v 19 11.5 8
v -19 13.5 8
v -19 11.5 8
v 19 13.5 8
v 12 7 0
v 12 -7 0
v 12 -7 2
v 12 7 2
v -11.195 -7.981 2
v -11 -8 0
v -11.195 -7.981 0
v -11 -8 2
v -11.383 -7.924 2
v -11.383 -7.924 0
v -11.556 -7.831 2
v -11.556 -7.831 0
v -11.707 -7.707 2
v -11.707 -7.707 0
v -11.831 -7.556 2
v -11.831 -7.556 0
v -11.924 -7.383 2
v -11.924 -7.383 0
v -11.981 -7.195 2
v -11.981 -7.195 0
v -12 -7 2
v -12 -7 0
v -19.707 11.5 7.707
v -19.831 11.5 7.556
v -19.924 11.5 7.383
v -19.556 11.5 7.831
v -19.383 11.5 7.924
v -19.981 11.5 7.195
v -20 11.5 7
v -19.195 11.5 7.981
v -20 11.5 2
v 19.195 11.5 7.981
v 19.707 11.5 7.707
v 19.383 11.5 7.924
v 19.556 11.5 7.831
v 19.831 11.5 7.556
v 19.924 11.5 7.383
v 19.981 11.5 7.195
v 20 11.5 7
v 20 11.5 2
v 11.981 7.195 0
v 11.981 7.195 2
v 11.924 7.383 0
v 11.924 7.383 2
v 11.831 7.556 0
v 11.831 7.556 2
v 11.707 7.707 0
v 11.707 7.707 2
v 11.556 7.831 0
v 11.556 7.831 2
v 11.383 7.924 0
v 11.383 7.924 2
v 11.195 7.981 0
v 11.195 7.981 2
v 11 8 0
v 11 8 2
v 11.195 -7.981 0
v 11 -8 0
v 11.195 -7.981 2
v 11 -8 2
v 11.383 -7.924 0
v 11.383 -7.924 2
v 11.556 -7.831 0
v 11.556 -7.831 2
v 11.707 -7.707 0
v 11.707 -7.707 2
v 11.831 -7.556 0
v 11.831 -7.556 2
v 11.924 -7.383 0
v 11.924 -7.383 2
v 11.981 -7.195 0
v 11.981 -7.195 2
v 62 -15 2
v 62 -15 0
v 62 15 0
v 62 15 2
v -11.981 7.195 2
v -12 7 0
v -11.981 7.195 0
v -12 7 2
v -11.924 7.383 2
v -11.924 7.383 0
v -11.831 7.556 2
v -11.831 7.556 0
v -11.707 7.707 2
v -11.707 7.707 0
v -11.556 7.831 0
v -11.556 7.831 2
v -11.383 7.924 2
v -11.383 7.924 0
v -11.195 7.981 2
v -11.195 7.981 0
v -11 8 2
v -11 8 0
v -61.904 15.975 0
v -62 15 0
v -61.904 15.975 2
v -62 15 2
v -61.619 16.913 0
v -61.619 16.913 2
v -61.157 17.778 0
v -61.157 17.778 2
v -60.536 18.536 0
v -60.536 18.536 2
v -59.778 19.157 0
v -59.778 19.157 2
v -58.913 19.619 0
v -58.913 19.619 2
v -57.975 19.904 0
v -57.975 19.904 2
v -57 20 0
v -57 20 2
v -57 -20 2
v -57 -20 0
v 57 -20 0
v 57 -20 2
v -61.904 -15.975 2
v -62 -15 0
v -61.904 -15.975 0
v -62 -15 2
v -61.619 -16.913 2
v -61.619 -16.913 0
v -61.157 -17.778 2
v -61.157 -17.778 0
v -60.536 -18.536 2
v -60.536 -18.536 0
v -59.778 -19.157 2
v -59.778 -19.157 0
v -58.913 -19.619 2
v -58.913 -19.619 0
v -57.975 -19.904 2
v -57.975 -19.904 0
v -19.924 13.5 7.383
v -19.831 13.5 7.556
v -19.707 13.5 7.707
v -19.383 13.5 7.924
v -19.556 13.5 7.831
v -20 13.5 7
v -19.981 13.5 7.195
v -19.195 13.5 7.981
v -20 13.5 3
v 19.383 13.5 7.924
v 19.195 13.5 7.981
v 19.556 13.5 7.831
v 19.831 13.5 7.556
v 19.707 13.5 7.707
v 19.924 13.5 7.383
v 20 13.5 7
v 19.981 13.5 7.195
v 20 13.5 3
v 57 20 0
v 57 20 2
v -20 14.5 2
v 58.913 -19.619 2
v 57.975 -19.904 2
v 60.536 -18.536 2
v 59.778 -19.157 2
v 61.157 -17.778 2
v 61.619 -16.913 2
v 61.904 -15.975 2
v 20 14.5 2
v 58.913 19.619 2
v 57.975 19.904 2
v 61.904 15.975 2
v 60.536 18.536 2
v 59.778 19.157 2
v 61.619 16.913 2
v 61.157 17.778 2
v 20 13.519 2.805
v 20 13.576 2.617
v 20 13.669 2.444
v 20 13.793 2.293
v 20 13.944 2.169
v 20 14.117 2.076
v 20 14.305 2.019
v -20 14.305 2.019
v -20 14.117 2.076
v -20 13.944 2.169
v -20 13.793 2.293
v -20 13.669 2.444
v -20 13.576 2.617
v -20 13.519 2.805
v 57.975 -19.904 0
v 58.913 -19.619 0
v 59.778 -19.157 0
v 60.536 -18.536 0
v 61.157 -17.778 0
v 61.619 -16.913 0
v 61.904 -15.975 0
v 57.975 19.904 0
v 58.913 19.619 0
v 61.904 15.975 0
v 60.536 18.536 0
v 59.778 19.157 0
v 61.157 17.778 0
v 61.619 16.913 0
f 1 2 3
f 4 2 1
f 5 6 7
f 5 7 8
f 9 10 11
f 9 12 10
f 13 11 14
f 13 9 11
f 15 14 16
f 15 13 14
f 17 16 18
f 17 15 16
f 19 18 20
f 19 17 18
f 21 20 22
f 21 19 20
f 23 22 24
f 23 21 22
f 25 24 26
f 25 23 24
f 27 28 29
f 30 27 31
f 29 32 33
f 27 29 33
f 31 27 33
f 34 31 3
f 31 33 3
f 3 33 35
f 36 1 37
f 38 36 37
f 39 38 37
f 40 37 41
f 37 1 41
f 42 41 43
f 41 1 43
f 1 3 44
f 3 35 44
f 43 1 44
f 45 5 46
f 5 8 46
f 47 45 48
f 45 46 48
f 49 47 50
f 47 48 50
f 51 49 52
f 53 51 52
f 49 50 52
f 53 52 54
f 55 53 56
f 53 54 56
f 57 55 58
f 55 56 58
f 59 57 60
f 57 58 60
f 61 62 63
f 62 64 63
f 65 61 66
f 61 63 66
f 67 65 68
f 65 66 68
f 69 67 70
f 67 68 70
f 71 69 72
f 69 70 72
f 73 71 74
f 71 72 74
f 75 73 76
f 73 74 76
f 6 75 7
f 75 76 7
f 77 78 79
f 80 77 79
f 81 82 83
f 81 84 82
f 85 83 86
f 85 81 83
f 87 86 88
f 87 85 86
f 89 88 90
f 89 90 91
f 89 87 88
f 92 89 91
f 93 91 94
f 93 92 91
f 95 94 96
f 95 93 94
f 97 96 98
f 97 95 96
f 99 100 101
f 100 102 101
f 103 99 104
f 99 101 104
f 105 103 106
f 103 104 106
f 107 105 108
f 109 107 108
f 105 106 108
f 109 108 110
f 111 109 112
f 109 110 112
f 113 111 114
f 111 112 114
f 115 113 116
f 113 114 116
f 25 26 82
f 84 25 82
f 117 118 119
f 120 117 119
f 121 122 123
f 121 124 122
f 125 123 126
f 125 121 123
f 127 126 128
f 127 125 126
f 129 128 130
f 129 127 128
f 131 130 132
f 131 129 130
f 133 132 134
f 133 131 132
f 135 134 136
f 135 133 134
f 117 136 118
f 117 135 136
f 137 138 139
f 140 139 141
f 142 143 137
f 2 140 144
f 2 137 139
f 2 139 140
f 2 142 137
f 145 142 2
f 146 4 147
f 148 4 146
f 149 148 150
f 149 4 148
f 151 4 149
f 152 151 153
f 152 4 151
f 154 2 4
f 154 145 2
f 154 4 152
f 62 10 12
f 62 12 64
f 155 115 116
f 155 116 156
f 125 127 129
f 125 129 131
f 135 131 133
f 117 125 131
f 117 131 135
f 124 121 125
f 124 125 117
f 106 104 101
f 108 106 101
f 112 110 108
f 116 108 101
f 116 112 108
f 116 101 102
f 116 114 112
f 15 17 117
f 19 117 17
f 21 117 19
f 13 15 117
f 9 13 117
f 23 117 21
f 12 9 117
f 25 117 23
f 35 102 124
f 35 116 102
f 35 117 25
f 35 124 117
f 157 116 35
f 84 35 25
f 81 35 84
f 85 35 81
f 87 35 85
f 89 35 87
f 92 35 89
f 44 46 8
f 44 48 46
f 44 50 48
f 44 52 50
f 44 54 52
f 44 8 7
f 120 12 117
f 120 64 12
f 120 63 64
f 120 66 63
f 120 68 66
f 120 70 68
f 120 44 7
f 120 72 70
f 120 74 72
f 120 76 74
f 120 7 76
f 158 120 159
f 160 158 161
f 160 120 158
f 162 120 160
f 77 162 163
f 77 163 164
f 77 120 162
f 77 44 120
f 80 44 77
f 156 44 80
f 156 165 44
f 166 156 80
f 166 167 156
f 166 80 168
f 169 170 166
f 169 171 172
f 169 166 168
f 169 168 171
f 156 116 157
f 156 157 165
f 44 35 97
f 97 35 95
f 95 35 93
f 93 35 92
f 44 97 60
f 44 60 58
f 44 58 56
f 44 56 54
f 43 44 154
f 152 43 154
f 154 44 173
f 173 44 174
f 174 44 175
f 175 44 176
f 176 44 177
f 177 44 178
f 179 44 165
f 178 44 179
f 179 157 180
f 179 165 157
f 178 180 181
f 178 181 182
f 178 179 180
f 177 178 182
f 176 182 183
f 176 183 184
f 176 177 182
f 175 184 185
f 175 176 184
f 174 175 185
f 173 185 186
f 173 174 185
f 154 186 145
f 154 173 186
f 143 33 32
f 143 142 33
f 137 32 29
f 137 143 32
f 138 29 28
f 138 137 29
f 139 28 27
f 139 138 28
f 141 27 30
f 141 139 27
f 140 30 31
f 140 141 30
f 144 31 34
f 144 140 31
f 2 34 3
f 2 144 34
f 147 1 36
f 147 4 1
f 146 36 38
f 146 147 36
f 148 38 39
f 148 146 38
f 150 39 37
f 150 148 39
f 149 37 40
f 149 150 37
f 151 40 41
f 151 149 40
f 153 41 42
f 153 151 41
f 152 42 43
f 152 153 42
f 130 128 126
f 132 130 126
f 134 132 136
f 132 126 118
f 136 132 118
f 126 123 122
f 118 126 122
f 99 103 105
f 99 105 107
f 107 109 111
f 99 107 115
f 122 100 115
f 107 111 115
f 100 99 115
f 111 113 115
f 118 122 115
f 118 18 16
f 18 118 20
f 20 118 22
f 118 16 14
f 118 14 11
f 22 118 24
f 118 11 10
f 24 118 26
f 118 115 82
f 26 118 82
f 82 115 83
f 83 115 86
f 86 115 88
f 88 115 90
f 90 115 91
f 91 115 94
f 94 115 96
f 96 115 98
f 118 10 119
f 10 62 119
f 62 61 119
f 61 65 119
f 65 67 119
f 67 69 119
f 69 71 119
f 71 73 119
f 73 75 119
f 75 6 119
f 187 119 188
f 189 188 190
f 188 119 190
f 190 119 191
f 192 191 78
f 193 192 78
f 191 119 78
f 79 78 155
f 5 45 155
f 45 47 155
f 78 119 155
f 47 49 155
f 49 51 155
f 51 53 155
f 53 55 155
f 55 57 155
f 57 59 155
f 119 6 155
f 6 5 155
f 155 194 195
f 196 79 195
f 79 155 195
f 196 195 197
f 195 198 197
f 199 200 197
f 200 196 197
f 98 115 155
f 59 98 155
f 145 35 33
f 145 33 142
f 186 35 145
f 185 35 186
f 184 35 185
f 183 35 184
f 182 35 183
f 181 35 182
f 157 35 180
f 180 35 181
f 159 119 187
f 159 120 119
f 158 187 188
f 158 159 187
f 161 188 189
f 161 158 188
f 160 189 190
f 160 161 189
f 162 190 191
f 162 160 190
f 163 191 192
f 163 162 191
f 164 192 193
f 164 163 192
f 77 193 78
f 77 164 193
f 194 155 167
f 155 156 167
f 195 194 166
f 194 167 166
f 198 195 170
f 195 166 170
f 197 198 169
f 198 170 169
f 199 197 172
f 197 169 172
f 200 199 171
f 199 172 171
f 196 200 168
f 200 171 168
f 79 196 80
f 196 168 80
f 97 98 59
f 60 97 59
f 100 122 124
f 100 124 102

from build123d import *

# Parameters (mm, degrees)
F0_W     = 124
F0_H     = 40
F0_W_2   = 24
F0_H_2   = 16
F0_W_3   = 40
F0_H_3   = 2
F1_DEPTH = 2
F2_R     = 5
F3_R     = 1
F4_DEPTH = 8
F5_R     = 1


with BuildPart() as f1:
    # F0 (on Top) → F1 (new body)
    with BuildSketch(Plane.XY):
        Rectangle(F0_W, F0_H)
        Rectangle(F0_W_2, F0_H_2, mode=Mode.SUBTRACT)
        with Locations((0, 12.5)):
            Rectangle(F0_W_3, F0_H_3, mode=Mode.SUBTRACT)
    extrude(amount=F1_DEPTH)

    # F2
    f2_edges = [f1.edges().sort_by_distance(p)[0] for p in [
        (-62, 20, 1),
        (62, 20, 1),
        (62, -20, 1),
        (-62, -20, 1),
    ]]
    fillet(f2_edges, radius=F2_R)

    # F3
    f3_edges = [f1.edges().sort_by_distance(p)[0] for p in [
        (12, -8, 1),
        (-12, -8, 1),
        (12, 8, 1),
        (-12, 8, 1),
    ]]
    fillet(f3_edges, radius=F3_R)

    # F0 (on Top) → F4 (join)
    with BuildSketch(Plane.XY):
        with Locations((0, 12.5)):
            Rectangle(F0_W_3, F0_H_3)
    extrude(amount=F4_DEPTH)

    # F5
    f5_edges = [f1.edges().sort_by_distance(p)[0] for p in [
        (0, 13.5, 2),
        (20, 12.5, 8),
        (-20, 12.5, 8),
    ]]
    fillet(f5_edges, radius=F5_R)


solid = f1.part
